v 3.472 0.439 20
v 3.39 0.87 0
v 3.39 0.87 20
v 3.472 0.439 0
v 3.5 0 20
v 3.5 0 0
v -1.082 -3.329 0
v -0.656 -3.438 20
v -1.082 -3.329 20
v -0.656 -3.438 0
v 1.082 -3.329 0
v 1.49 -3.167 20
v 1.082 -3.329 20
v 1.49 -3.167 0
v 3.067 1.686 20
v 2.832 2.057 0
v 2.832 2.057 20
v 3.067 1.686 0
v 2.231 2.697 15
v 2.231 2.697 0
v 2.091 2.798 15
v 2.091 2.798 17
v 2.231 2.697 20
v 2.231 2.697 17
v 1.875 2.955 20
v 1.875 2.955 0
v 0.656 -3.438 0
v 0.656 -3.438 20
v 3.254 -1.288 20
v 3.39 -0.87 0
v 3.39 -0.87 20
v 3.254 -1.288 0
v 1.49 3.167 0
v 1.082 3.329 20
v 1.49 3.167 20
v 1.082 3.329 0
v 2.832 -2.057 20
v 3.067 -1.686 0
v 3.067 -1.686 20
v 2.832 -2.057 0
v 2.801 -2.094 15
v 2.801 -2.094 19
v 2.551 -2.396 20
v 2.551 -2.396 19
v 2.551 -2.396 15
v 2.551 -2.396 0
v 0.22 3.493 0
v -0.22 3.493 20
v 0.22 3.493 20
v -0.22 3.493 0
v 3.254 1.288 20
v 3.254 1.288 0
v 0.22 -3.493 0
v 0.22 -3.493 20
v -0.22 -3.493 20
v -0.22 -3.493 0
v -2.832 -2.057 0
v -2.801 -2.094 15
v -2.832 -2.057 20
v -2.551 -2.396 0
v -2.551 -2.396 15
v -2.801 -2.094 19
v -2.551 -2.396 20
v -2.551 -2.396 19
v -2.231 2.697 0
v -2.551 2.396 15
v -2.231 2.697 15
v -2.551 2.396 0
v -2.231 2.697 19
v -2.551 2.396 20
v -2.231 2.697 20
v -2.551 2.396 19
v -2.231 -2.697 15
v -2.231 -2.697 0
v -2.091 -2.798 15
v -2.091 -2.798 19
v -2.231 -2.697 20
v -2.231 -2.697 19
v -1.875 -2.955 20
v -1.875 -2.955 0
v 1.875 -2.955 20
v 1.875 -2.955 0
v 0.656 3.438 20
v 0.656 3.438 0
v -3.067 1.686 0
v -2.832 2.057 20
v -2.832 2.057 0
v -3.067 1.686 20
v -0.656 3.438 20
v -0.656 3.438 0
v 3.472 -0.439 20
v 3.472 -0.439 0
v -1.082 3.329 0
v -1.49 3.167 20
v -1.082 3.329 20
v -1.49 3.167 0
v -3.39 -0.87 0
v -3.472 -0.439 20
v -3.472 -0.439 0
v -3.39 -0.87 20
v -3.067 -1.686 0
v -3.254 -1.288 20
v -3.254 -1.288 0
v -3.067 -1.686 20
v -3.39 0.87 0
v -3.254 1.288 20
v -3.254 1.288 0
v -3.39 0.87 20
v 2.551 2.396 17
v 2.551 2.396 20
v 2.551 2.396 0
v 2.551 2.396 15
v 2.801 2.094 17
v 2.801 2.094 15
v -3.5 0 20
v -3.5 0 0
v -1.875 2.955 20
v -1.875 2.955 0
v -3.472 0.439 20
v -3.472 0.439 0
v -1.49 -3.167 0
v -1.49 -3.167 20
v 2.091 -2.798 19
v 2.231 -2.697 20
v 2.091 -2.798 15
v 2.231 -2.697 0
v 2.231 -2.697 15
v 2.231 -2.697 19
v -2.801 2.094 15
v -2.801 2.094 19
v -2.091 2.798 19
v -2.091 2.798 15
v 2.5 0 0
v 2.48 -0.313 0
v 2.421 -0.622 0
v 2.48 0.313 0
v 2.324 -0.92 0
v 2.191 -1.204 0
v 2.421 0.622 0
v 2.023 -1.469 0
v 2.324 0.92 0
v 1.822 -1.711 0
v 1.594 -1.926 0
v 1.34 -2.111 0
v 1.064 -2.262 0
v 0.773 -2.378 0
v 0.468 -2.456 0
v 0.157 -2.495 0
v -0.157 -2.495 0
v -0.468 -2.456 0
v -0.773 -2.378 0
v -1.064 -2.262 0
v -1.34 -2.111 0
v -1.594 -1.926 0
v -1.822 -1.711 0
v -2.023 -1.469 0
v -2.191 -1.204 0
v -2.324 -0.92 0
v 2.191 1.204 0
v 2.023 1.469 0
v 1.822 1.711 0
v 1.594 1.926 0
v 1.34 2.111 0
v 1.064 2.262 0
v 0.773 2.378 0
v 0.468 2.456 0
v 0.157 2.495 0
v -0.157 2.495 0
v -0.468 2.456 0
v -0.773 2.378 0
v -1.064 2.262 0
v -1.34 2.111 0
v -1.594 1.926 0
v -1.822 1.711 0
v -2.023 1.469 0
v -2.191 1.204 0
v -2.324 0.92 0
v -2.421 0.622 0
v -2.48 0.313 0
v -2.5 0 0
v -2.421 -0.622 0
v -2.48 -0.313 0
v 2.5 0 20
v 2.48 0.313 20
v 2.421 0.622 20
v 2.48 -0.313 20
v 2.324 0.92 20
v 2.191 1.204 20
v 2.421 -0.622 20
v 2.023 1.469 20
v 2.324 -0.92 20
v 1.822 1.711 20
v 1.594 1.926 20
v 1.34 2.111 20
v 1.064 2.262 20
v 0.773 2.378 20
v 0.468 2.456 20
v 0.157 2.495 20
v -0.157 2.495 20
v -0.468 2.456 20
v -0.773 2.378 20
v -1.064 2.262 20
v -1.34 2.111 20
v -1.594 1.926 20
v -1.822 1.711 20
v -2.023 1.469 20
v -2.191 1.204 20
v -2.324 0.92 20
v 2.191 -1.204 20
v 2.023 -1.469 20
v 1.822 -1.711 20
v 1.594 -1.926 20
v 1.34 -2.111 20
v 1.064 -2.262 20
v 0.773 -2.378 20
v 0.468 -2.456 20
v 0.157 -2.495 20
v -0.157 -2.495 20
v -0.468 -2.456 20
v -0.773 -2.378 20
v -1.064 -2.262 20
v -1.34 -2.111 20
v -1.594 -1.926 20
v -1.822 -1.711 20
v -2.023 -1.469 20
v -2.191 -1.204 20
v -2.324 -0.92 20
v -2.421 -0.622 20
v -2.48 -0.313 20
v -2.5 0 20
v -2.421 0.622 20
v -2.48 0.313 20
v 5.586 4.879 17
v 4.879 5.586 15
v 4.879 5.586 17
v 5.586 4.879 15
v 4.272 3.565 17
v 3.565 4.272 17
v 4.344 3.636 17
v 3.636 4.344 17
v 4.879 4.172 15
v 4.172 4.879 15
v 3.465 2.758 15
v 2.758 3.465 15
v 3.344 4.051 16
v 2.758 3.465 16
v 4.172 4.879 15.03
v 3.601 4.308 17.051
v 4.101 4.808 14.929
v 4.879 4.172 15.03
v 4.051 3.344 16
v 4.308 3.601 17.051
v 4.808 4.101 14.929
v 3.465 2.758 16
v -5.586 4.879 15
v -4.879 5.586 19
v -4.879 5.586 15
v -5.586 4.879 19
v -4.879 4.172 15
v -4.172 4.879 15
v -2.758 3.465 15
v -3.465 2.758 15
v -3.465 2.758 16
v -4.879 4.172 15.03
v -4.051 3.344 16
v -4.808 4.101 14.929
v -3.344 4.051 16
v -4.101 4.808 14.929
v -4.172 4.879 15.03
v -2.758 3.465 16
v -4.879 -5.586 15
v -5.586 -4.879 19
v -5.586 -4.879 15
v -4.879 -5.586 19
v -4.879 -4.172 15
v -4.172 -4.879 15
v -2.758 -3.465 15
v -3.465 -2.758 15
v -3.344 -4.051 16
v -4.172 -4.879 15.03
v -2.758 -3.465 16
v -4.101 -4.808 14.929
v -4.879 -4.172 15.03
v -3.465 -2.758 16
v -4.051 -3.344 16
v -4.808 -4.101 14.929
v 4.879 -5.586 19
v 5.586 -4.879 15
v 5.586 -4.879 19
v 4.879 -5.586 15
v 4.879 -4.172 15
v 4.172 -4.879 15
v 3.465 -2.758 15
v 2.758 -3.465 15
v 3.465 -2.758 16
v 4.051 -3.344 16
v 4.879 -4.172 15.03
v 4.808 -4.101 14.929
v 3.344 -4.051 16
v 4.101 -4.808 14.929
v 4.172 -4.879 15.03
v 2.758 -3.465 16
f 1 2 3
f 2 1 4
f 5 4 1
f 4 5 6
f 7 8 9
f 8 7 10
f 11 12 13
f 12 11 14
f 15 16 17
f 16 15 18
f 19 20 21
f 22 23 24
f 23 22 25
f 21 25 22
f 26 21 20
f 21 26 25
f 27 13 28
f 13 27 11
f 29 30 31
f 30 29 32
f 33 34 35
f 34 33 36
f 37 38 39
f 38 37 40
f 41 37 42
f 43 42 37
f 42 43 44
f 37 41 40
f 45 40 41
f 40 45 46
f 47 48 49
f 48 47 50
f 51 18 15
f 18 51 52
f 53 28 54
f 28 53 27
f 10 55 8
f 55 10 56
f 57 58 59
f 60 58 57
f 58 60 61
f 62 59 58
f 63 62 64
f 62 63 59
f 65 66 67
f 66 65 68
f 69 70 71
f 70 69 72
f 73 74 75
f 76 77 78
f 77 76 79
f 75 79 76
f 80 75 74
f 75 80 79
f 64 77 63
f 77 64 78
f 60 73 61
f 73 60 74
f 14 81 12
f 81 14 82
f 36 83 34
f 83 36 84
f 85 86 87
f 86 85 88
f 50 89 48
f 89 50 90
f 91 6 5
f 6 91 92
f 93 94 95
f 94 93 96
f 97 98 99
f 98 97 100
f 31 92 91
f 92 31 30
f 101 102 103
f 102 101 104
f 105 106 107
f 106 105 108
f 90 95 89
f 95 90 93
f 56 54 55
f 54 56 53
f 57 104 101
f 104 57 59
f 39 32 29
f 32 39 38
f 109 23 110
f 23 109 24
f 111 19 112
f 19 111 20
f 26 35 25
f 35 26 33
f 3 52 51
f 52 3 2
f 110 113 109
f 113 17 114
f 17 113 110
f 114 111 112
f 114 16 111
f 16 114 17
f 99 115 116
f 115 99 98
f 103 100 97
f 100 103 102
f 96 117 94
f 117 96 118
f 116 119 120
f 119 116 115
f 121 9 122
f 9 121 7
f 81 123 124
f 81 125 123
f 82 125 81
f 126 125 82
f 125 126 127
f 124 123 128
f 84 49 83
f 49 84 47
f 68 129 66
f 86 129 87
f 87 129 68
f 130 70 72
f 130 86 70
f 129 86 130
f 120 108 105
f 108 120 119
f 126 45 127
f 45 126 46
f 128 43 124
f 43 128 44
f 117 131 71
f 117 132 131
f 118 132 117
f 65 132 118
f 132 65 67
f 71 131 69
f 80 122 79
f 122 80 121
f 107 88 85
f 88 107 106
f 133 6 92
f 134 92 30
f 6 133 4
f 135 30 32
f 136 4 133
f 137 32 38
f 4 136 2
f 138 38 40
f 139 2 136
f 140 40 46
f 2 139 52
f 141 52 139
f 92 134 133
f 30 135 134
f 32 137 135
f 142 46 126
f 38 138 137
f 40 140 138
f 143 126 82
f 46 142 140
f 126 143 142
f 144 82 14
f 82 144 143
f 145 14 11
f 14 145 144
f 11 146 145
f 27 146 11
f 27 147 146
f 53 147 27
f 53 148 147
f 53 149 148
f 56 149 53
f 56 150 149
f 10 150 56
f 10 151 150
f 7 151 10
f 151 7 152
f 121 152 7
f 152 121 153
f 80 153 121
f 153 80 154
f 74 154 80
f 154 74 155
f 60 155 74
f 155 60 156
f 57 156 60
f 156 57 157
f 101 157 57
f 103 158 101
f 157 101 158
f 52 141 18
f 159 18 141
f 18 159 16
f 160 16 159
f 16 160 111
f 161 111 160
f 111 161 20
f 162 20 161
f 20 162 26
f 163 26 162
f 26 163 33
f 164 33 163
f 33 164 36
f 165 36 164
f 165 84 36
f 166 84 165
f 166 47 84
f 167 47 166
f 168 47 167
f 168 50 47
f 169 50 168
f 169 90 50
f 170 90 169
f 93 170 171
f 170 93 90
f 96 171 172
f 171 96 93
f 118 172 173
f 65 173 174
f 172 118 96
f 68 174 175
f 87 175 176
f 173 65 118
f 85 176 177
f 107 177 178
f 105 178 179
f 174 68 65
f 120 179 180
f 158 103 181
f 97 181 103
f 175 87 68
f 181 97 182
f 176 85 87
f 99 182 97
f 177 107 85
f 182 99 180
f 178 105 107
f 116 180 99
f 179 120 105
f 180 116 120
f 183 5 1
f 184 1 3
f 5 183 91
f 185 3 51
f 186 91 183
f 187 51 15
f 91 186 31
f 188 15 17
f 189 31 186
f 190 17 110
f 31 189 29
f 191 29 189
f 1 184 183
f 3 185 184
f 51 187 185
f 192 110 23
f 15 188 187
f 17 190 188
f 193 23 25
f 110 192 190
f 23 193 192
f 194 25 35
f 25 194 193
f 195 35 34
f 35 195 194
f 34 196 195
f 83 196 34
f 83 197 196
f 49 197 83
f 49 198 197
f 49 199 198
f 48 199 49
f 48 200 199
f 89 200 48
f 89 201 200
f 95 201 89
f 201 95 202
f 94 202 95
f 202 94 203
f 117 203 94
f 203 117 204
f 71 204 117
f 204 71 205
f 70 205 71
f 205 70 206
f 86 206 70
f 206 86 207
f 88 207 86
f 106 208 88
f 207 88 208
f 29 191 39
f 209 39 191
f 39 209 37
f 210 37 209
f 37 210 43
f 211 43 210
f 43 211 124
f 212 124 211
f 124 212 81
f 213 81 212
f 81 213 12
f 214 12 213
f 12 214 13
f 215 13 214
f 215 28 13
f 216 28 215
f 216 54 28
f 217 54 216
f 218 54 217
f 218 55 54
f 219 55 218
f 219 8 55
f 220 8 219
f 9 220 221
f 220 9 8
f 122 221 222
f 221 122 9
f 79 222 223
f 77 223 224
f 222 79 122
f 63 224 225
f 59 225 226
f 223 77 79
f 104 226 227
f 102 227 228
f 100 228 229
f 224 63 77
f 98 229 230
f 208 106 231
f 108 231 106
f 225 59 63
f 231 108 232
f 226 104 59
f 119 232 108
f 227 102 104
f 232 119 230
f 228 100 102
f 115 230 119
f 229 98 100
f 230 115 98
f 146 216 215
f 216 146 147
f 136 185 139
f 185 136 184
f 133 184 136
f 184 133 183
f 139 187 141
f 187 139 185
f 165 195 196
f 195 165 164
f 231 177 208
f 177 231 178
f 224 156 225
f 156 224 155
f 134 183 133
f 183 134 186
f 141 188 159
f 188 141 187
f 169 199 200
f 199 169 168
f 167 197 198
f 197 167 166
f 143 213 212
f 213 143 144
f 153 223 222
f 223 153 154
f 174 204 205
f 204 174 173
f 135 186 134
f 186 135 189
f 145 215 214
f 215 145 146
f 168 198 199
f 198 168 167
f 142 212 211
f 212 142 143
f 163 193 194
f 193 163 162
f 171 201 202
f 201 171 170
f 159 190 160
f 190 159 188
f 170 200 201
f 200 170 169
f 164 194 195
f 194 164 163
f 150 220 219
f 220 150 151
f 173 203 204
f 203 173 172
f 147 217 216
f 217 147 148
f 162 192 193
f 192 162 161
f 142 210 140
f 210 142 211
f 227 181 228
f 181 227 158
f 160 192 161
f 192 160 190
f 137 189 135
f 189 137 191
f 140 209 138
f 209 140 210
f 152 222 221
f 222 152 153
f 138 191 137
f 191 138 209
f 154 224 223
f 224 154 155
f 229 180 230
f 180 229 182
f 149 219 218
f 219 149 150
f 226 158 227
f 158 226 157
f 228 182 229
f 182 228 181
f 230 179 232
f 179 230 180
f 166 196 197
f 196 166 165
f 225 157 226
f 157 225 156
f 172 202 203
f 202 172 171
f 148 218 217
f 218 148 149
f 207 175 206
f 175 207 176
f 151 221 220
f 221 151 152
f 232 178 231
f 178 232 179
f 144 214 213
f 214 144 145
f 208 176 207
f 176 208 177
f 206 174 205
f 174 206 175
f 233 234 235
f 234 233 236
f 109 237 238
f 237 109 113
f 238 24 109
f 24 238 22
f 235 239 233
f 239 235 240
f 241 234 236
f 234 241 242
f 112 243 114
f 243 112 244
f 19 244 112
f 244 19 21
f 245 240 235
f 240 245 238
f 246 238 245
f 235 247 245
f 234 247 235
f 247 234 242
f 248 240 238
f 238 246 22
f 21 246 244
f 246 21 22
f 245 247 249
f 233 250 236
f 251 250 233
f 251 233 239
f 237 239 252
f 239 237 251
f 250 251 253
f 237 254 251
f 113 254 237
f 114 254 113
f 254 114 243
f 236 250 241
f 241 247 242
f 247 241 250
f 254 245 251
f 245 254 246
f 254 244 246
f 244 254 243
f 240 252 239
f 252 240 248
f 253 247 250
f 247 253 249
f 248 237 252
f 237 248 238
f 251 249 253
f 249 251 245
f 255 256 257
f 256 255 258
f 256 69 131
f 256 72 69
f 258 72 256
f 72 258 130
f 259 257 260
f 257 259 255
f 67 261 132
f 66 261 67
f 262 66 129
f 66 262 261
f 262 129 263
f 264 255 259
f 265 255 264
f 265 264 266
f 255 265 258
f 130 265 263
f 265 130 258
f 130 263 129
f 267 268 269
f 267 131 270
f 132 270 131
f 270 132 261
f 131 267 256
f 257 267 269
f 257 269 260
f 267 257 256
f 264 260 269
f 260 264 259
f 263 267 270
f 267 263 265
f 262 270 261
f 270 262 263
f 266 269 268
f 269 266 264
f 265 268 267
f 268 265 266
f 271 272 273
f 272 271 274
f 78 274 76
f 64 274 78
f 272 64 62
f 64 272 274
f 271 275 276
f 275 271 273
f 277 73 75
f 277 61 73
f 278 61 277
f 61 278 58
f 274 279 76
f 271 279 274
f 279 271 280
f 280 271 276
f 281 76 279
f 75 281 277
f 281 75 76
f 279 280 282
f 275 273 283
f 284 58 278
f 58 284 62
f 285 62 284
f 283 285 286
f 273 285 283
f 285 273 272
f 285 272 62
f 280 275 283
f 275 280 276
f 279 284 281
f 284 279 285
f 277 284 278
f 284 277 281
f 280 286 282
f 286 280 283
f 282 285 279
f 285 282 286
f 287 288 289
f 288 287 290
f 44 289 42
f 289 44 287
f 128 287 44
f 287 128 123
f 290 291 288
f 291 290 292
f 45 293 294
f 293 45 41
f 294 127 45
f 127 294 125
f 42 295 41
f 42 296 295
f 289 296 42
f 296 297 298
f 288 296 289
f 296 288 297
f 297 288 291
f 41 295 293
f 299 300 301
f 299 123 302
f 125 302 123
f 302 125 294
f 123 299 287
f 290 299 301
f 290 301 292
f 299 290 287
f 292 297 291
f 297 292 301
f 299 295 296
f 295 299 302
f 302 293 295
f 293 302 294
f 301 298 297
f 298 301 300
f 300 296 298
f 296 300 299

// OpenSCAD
$fn=50;
module tube() {
    module anchor(h) {
        // Center the y axis
        translate([0,-0.5,0]){
            difference(){
                cube([4,1,h]);
                translate([1,-0.5,-0.5]){
                    cube([2,2,1.5]);
                }
            }
            rotate([0,45,0]) {
                translate([0.1,0,2]){
                    cube([2,1,1]);
                }
            }
        }
    }
    difference() {
        cylinder(d=7,h=20);
        translate([0,0,-0.5]){
            cylinder(d=5,h=21);
        }
    }
    rotate([0,0,45]){
        translate([3.4,0,15]){
            anchor(h=2);
        }
    }
    rotate([0,0,135]){
        translate([3.4,0,15]){
            anchor(h=4);
        }
    }
    rotate([0,0,225]){
        translate([3.4,0,15]){
            anchor(h=4);
        }
    }
    rotate([0,0,315]){
        translate([3.4,0,15]){
            anchor(h=4);
        }
    }
}
tube();
